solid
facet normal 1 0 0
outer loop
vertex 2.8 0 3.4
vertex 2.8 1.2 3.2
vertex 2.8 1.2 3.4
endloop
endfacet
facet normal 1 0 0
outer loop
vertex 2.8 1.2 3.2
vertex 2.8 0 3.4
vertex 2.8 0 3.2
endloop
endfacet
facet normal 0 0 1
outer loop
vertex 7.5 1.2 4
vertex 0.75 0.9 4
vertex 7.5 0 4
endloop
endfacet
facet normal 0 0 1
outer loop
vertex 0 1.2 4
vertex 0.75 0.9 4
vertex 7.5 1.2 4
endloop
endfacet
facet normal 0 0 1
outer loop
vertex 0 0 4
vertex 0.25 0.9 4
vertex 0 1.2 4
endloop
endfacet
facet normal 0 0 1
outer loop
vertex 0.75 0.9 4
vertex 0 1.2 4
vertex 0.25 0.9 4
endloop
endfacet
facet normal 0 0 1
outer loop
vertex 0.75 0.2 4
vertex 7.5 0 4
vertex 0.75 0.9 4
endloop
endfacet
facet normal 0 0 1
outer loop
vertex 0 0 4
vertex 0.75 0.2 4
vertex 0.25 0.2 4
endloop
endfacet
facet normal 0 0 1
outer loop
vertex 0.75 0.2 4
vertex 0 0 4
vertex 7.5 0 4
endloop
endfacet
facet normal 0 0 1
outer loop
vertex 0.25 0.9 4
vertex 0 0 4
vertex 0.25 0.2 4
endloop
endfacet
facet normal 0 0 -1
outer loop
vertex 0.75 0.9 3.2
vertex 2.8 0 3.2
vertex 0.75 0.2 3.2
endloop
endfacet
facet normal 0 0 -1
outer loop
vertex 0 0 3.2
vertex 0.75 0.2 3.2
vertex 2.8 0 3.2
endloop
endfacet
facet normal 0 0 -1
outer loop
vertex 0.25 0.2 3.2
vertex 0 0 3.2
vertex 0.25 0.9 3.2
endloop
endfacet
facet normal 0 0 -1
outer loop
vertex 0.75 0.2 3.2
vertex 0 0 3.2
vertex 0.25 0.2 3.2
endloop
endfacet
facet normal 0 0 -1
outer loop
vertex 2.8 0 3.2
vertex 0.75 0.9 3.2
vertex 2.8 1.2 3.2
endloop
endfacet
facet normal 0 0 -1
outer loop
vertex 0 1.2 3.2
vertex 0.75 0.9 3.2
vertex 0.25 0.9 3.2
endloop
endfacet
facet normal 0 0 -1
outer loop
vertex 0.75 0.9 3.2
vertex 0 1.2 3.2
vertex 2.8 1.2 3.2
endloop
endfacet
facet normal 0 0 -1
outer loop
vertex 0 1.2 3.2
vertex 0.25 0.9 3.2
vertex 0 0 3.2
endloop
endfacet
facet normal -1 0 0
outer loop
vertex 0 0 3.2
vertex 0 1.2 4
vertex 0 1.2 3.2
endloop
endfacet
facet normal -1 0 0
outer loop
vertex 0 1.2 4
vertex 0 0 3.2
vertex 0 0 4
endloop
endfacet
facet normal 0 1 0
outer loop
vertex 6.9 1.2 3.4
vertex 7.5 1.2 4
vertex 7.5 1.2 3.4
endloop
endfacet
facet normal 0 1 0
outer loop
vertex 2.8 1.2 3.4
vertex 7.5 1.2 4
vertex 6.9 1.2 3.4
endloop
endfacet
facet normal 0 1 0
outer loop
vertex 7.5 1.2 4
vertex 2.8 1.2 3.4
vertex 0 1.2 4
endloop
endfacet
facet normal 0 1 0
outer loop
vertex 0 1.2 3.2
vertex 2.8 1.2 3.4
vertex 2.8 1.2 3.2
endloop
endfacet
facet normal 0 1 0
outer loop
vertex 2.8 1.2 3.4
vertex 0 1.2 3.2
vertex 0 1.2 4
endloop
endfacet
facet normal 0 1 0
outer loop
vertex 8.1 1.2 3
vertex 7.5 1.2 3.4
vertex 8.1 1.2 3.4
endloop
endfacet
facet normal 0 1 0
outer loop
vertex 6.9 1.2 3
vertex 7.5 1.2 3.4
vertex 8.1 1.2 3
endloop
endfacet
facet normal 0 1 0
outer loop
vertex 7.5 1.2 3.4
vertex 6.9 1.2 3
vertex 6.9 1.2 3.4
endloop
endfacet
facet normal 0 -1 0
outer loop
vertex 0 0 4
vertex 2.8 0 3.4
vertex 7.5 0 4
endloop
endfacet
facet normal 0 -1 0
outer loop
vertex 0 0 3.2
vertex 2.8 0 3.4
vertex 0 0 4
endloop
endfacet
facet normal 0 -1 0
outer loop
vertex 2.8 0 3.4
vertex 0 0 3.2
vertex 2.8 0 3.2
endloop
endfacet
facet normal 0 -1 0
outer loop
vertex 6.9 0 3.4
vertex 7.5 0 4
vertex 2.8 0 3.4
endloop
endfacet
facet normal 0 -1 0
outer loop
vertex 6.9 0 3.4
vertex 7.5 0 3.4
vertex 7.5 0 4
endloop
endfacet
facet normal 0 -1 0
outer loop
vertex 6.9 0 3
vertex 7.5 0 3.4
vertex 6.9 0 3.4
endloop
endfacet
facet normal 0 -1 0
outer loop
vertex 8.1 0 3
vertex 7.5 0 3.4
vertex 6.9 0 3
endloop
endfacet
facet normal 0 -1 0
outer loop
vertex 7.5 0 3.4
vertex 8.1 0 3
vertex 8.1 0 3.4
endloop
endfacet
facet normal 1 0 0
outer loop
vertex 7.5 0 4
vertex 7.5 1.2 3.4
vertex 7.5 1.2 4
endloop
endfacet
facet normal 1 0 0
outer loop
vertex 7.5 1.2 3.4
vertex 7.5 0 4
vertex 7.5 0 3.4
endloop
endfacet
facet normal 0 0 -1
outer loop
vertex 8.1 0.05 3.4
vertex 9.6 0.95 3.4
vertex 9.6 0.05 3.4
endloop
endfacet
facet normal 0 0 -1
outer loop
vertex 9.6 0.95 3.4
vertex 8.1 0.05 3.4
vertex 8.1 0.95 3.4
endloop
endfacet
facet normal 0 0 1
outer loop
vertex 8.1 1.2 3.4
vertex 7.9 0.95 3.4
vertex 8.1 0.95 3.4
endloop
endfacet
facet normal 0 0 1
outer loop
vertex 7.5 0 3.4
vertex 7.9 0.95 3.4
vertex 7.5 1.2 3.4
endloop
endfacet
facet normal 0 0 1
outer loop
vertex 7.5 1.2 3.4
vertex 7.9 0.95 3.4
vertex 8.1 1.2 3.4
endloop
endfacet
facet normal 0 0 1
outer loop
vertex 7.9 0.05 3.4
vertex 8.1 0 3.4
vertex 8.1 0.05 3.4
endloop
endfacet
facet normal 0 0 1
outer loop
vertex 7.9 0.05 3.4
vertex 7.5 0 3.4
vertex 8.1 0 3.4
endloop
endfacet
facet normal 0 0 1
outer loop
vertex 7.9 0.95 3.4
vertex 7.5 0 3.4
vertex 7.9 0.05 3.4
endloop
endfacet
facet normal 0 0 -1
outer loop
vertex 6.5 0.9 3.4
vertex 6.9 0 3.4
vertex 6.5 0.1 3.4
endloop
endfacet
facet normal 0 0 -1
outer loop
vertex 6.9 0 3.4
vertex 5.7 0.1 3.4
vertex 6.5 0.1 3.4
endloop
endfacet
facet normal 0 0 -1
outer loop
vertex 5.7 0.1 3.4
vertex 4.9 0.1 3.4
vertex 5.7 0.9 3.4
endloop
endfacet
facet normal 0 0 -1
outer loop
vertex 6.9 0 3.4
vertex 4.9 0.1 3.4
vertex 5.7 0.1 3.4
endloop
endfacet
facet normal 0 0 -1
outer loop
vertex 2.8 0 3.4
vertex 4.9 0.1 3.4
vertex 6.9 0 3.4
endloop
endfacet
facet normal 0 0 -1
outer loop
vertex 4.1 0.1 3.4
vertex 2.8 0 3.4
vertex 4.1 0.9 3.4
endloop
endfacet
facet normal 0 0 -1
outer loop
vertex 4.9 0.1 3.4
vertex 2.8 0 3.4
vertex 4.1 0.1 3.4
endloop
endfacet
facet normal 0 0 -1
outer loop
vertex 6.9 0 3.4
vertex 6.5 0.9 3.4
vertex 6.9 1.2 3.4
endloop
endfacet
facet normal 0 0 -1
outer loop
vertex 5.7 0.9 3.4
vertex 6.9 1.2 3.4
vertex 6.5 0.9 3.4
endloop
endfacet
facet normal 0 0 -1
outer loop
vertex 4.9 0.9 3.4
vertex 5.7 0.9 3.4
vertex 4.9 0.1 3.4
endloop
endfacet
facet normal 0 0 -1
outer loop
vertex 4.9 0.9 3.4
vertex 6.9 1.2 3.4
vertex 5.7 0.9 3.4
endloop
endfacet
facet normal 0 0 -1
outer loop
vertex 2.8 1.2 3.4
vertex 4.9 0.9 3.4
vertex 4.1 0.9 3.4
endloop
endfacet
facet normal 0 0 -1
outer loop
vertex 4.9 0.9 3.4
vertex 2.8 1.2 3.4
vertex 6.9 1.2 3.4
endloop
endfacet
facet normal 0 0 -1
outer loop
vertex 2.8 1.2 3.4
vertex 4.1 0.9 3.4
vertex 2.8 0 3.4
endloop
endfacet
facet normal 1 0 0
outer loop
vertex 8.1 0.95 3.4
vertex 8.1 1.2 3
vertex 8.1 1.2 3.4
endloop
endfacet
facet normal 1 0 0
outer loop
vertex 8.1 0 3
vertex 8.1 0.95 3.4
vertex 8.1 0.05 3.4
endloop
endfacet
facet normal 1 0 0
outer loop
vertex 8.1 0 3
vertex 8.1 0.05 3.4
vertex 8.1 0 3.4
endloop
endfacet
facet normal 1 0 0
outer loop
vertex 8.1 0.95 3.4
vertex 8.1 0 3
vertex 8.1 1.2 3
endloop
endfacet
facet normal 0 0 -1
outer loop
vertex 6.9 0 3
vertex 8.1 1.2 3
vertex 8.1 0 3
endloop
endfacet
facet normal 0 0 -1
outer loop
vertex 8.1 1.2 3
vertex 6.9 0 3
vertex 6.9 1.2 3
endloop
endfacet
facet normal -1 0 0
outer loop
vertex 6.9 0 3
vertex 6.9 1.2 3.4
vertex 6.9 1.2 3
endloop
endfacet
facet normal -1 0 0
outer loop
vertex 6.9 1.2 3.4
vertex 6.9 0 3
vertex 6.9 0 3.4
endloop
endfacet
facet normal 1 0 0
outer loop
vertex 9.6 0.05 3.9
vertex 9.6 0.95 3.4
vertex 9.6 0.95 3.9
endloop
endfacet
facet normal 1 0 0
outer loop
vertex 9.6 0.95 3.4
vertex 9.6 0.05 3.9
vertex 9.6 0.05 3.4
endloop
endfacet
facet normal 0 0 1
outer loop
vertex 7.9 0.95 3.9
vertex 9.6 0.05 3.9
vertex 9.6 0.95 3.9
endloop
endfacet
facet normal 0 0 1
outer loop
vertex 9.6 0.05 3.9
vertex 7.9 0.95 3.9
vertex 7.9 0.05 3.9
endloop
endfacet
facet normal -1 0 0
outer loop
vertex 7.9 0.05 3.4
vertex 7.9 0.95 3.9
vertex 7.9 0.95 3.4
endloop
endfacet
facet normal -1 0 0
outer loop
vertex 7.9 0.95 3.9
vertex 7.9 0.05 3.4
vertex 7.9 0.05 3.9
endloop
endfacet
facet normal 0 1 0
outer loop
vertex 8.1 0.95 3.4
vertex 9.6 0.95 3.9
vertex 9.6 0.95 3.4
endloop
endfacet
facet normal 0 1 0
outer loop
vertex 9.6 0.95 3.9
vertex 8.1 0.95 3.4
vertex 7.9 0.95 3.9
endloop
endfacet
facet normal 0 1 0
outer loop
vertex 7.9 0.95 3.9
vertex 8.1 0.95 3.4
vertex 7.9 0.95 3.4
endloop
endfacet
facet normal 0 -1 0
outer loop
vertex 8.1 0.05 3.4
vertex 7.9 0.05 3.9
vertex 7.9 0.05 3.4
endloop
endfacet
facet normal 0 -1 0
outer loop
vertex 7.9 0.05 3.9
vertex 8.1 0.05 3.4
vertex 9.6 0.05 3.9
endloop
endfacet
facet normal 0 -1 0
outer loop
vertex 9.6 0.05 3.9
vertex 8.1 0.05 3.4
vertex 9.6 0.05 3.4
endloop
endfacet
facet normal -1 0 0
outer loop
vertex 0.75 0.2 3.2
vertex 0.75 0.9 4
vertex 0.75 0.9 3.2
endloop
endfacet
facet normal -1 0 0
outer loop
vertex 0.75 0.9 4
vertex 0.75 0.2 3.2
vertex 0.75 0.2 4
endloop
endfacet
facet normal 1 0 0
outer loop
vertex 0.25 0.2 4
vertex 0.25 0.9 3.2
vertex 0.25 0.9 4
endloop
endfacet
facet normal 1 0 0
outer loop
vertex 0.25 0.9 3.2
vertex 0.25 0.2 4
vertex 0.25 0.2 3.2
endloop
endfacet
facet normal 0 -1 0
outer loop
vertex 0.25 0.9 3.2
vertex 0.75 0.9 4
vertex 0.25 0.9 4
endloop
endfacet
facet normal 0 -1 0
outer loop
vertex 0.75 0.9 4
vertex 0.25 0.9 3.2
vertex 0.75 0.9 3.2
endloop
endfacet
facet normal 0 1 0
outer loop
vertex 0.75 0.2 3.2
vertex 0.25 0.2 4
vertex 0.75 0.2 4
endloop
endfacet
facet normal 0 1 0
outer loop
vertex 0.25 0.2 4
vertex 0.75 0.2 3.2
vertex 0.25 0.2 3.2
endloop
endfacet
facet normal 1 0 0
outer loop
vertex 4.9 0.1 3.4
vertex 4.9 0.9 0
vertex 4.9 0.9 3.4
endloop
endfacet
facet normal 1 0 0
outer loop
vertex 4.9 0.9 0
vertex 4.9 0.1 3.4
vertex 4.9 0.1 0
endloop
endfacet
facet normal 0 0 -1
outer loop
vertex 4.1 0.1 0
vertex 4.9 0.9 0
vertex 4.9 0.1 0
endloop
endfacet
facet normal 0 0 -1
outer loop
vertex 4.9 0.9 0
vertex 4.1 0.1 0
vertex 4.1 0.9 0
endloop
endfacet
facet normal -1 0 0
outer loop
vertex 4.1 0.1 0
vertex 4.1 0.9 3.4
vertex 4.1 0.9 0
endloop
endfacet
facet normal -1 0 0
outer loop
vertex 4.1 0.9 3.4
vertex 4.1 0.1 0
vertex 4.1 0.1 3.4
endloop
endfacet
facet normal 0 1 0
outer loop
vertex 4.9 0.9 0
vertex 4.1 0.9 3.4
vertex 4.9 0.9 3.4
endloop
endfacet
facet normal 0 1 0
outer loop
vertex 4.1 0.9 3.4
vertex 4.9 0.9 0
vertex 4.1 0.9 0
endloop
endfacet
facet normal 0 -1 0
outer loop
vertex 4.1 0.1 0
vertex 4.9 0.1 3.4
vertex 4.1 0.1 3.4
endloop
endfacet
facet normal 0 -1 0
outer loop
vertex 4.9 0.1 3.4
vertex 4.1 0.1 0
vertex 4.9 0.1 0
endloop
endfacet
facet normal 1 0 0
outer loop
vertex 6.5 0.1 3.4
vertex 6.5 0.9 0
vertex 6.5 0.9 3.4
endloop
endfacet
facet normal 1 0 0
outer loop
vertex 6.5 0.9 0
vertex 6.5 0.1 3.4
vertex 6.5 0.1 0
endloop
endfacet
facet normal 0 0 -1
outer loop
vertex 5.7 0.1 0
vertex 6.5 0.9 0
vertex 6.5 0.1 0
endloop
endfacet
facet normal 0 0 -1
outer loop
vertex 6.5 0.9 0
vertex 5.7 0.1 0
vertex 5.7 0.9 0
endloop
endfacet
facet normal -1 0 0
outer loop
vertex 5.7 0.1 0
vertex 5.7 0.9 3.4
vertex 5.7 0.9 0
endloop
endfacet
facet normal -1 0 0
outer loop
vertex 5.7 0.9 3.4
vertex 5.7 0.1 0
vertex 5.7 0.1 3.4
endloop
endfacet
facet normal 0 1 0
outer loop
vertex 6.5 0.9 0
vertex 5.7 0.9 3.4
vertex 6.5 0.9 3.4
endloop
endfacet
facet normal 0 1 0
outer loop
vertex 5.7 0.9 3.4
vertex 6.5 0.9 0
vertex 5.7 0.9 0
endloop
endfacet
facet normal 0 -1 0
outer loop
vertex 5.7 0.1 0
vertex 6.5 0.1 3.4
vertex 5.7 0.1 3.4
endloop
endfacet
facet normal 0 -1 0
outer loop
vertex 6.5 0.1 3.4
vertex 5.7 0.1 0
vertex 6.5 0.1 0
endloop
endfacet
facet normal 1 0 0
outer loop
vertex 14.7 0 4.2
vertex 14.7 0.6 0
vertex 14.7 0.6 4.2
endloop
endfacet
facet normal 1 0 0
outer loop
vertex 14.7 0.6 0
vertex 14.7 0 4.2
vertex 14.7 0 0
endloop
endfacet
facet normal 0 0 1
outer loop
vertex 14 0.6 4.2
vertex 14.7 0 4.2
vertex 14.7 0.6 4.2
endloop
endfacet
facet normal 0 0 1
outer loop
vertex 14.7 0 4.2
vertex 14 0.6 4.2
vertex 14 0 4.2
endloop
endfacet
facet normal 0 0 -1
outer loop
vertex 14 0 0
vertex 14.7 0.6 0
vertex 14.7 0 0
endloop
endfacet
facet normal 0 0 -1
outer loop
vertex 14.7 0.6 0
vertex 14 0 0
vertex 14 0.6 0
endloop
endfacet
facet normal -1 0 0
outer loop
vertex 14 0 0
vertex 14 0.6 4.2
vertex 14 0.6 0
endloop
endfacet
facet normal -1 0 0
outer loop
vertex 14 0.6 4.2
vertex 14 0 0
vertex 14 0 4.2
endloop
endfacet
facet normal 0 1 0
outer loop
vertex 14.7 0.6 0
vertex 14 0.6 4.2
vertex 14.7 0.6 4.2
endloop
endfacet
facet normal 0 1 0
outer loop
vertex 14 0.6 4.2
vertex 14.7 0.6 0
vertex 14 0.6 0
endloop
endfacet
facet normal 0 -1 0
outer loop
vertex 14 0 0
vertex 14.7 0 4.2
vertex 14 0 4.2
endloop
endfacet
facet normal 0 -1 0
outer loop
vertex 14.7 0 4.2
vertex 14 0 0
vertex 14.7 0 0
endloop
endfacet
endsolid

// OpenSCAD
// Revised retainer concept. Not the case.
// Fence-parallel leaf. In x the shelf (up), the lip (down), and the bump (up)
// are in that order, so the preload loop closes. The latch only locks the slide.
// Print pose of part="clip": retention face up, bump 1.00 x 1.00 x 0.40,
// pillars 0.80 mm square. part="seat" adds the fence, lip, stop, and shell wall.
part = "clip";
$fn = 16;

module pillars() {
  module one(x, y) {
    translate([x, y, 0]) cube([0.80, 0.80, 3.42]);
    translate([x + 0.15, y + 0.15, 3.40]) cube([0.50, 0.50, 0.15]);
  }
  // Beside the bump, not on its contact face. Bump is x 7.00–8.00.
  one(4.10, 0.10);
  one(5.70, 0.10);
}

module clip_solid() {
  difference() {
    union() {
      // Anchor plate, 0.80 thick. Top z=4.00 is the face under the lip.
    translate([0, 0, 3.20]) cube([2.80, 1.20, 0.80]);
    // Leaf, 0.60 thick, 1.20 wide. Free edge of the lip is x=2.80.
    // Bump centre is x=7.50, so the free length is 4.70.
    translate([2.70, 0, 3.40]) cube([4.80, 1.20, 0.60]);
    // Bump 1.20 x 1.20 x 0.40. Centre x=7.50.
    translate([6.90, 0, 3.00]) cube([1.20, 1.20, 0.40]);
      // Position tooth under the lip's downstream edge. Square top at z=4.00.
      // It stops at x=2.75 so the lip, which starts at x=1.20 and ends at 2.80, keeps 0.05 mm of x play.
      translate([2.40, 0.25, 3.70]) cube([0.35, 0.50, 0.30]);
      // Release tab on the leaf tip, inside the leaf's y.
      translate([7.90, 0.05, 3.40]) cube([1.70, 0.90, 0.50]);
    }
    // Slot for the carrier stop. Outboard play is 0.08 mm (peg starts at y=0.28).
    translate([0.25, 0.20, 3.10]) cube([0.50, 0.70, 1.00]);
  }
}

module seat_carrier() {
  union() {
    // Shelf. Top is z=3.20, flush with the heel bottom. x 0–1.00.
    translate([-0.30, -0.20, 0]) cube([1.50, 1.40, 3.20]);
    // Lip post and lip. Lip underside z=4.00, x 1.20–2.80.
    translate([1.20, -0.70, 0]) cube([1.60, 0.70, 4.80]);
    translate([1.20, -0.10, 4.00]) cube([1.60, 1.20, 0.70]);
    // Stop peg. Slot is y 0.20–0.90. Peg y 0.28–0.82, so 0.08 outboard play.
    translate([0.35, 0.28, 3.30]) cube([0.30, 0.54, 0.70]);
    // The lip end at x=2.80 is the x stop for the tooth. No second hook.
  }
}

module shell_wall() {
  // Inboard face at y=-0.30. Seated heel face is y=0, so the air is 0.30 mm.
  // Against the stop the clip moves 0.08 and the air is 0.22 mm.
  translate([-0.40, -0.60, 0]) cube([3.2, 0.30, 5.3]);
}

if (part == "seat") {
  color("burlywood") seat_carrier();
  color("khaki") clip_solid();
  color("lightblue") shell_wall();
} else {
  clip_solid();
  pillars();
  translate([14, 0, 0]) cube([0.70, 0.60, 4.20]);
}
